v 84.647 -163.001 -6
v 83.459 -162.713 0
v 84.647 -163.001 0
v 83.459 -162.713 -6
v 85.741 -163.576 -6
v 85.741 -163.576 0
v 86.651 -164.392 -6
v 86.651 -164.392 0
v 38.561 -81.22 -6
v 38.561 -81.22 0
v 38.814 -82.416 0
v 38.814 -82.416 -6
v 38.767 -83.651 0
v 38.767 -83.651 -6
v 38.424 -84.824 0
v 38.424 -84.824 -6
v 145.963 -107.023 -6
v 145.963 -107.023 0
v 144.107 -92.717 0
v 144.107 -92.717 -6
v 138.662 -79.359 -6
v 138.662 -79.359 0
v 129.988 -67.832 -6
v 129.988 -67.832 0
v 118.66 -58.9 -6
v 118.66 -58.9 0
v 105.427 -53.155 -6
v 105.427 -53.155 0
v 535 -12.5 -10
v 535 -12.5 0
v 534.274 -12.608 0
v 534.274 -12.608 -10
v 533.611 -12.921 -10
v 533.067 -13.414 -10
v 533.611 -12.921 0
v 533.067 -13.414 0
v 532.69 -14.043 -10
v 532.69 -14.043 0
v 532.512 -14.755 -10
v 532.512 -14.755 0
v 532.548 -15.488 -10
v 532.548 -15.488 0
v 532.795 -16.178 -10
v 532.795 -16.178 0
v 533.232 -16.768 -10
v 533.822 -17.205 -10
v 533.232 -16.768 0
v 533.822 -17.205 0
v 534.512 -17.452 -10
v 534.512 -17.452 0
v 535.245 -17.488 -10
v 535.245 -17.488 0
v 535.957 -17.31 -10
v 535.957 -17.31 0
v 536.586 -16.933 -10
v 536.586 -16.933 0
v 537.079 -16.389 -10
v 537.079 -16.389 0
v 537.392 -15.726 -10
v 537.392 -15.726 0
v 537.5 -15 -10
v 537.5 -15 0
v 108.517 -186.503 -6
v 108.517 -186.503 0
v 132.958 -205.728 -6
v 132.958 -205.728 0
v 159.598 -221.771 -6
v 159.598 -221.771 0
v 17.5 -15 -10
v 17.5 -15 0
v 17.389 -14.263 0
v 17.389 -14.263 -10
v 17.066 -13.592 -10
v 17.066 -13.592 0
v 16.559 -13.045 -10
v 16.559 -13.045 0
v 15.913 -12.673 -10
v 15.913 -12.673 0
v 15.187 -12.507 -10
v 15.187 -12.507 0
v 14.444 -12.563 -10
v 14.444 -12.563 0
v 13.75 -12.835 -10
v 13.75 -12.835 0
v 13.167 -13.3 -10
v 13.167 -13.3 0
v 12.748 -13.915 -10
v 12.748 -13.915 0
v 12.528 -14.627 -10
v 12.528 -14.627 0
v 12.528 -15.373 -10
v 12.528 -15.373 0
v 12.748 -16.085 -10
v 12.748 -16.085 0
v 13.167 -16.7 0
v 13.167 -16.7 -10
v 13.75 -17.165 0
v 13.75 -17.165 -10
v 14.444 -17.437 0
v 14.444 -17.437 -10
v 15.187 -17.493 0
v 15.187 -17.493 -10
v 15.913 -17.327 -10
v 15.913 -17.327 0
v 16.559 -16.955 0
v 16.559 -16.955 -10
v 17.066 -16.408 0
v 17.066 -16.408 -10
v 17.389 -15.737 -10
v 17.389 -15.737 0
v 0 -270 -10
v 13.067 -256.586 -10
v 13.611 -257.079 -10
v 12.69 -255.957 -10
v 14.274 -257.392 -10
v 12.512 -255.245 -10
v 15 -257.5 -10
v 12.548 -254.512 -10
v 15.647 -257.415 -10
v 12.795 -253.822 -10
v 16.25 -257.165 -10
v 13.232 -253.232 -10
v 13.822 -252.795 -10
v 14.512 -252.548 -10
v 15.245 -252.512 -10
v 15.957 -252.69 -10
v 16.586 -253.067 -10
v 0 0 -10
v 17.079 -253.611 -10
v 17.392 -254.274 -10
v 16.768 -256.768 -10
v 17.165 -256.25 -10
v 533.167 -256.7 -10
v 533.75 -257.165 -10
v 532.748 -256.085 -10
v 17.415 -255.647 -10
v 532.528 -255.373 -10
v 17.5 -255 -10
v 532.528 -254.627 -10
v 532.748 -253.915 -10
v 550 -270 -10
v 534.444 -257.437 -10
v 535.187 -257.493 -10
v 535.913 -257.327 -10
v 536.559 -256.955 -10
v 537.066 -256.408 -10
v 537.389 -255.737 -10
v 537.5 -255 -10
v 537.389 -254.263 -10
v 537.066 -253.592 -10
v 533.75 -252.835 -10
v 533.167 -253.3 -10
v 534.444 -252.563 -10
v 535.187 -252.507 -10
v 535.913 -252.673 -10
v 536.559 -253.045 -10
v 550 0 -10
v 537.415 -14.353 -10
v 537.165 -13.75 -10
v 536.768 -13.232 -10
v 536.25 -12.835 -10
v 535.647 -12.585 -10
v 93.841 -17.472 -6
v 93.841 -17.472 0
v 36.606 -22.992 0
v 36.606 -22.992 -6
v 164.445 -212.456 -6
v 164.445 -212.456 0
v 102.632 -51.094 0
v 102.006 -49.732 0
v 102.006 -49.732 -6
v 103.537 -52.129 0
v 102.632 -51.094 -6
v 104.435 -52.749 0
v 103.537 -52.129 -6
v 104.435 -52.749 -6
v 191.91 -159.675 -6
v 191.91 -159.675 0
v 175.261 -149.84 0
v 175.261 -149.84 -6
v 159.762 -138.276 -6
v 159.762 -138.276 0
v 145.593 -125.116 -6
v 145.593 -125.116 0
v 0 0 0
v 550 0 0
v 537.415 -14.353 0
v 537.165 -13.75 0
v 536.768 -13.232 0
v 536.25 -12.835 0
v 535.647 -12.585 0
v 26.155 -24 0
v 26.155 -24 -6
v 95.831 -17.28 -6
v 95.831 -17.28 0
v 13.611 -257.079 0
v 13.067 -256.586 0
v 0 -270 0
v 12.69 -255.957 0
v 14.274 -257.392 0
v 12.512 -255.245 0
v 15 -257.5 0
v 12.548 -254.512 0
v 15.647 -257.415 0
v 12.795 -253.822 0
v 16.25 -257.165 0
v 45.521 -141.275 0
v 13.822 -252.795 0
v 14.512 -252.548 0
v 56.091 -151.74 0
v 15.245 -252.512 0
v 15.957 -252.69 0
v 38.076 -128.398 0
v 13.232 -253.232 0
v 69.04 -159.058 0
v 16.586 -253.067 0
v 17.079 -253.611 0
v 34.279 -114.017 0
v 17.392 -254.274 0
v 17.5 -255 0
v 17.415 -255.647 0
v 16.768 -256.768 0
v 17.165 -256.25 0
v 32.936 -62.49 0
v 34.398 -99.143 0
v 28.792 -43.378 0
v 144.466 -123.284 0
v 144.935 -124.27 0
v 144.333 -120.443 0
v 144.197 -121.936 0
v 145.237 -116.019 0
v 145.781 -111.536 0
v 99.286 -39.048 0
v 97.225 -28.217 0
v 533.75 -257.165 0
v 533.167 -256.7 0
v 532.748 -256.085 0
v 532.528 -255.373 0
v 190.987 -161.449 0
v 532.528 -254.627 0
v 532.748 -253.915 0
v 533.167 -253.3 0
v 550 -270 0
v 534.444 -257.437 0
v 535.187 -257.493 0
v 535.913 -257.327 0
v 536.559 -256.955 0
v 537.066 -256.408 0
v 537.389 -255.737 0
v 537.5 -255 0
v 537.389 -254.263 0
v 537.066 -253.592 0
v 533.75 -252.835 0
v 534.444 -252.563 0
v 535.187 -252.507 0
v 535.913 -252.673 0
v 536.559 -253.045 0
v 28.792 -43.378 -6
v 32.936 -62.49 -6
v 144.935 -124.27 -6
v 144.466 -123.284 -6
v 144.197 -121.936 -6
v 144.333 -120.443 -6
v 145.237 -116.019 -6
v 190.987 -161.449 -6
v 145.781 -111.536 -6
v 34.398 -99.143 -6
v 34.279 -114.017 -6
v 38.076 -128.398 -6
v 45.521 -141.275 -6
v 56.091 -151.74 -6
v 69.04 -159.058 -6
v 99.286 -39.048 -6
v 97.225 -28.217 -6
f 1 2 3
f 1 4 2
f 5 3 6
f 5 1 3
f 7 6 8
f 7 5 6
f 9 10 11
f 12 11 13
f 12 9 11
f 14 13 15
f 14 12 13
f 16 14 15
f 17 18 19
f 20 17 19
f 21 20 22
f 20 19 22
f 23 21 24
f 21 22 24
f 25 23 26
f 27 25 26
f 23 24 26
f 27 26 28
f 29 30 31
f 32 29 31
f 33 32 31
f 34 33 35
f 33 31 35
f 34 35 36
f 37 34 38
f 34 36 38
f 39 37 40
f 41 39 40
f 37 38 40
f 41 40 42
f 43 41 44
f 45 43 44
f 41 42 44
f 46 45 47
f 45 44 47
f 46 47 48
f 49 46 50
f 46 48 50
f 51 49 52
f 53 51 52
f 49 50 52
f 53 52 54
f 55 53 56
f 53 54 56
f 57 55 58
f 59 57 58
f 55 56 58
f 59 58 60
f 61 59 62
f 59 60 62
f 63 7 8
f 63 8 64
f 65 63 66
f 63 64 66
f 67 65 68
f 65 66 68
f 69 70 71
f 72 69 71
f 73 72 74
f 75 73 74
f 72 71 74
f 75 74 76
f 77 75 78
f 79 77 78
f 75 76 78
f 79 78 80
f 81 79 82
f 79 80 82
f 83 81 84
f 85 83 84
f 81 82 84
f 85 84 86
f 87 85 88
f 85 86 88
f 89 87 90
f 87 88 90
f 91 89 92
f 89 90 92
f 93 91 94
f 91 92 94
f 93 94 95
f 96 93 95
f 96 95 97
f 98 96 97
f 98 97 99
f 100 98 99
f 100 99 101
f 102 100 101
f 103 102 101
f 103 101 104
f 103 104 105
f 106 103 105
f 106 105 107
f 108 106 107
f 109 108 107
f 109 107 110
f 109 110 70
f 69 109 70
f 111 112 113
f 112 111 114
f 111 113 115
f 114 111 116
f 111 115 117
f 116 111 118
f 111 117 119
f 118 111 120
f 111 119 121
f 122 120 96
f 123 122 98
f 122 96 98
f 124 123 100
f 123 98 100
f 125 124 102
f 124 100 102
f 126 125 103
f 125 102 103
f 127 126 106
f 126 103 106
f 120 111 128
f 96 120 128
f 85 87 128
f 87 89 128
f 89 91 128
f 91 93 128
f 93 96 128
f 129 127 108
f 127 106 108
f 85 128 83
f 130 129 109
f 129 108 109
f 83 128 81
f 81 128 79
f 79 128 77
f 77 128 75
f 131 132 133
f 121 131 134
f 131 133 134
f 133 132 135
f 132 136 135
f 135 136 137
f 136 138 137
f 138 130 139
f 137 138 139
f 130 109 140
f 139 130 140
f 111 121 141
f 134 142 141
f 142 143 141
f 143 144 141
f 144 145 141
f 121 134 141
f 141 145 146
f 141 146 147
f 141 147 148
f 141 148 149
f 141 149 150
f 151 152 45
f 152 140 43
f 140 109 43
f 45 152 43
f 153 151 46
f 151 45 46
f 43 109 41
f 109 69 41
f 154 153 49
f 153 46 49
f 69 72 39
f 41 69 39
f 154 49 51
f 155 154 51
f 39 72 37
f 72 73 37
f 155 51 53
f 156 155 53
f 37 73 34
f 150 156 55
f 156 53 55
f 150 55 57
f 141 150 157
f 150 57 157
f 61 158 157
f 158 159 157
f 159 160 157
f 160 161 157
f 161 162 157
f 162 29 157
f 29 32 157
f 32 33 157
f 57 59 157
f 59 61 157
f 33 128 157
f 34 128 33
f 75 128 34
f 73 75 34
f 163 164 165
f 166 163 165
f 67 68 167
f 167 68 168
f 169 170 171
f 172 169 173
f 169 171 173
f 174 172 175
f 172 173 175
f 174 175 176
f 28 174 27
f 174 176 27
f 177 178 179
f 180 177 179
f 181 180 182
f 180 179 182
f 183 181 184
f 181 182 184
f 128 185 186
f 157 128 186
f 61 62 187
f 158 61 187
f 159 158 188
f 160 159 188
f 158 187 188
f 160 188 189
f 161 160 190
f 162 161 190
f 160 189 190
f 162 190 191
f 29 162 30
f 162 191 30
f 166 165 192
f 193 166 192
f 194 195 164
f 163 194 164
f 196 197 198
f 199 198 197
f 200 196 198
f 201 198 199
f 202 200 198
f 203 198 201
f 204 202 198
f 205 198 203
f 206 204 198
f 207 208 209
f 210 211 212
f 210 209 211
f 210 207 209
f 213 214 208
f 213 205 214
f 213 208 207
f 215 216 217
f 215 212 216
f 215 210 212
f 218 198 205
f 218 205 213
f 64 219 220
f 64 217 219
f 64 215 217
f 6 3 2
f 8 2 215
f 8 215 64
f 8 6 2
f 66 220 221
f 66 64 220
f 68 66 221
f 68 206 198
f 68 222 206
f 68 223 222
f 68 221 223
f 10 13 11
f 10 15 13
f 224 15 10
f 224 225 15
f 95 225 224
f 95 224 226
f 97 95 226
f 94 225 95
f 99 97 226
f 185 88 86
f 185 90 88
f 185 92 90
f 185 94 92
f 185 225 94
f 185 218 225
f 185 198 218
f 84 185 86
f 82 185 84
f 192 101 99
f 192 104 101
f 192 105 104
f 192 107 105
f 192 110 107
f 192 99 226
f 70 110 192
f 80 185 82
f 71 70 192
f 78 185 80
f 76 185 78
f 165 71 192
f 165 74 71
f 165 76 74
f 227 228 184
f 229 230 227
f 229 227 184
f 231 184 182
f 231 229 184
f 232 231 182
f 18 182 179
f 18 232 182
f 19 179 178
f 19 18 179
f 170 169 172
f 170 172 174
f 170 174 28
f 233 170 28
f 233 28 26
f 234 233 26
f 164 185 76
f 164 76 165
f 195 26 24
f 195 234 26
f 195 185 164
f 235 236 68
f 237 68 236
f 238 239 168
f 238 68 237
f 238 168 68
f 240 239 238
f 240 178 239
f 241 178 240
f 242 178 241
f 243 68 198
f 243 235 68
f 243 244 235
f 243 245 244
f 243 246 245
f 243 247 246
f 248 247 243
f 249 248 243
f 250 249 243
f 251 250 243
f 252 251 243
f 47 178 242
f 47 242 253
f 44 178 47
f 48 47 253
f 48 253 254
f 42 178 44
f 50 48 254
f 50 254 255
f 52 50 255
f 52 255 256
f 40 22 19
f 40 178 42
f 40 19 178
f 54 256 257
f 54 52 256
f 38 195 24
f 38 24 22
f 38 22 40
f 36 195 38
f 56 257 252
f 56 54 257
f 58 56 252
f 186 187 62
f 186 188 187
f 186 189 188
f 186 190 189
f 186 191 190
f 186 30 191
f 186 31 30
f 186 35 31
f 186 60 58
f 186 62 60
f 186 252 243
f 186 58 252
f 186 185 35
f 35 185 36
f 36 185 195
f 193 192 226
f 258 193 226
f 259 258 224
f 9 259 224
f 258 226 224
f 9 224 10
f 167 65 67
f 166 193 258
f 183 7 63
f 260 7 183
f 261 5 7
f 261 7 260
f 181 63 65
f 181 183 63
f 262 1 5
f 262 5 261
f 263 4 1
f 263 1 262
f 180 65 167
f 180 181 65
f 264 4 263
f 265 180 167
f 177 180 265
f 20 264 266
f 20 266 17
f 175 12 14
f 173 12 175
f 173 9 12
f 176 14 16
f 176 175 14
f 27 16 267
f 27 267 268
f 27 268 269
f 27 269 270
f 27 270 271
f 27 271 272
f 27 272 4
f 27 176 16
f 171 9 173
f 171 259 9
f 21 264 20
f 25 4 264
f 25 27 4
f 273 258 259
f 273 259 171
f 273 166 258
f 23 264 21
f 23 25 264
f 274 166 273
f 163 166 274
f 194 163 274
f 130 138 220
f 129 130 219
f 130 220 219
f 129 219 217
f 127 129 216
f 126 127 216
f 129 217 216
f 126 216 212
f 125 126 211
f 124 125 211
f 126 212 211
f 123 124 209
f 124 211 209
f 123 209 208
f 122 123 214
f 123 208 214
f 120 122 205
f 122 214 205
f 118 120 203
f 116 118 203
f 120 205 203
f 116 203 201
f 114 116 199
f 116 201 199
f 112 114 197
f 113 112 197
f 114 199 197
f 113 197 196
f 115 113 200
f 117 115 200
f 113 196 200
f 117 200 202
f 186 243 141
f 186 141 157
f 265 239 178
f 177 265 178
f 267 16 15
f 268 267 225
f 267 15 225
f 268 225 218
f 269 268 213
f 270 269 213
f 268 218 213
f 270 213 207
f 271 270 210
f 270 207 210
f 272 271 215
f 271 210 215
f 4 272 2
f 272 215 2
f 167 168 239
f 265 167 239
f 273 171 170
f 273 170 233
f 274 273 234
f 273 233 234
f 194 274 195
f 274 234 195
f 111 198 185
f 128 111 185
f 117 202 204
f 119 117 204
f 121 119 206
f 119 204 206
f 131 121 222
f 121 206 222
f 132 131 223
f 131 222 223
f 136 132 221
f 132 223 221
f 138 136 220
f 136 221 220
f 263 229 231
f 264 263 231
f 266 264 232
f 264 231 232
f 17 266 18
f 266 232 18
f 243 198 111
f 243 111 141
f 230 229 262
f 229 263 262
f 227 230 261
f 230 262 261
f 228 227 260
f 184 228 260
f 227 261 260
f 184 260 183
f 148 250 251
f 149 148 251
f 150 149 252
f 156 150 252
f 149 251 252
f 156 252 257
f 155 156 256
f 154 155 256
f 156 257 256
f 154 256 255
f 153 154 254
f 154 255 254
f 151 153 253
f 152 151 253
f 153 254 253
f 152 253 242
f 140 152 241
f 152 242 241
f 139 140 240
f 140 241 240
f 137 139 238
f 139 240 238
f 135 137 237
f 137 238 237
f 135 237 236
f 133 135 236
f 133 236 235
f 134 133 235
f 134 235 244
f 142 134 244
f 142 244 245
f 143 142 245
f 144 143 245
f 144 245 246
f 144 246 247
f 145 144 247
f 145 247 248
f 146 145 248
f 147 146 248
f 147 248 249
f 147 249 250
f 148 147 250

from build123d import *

# Parameters (mm, degrees)
F0_W     = 550
F0_H     = 270
F1_DEPTH = 10
F3_DEPTH = 6
F2_R     = 2.5
F4_DEPTH = 25
F5_R     = 5


with BuildPart() as f1:
    # F0 (on Top) → F1 (new body)
    with BuildSketch(Plane.XY):
        with Locations((275, -135)):
            Rectangle(F0_W, F0_H)
    extrude(amount=-F1_DEPTH)

    # F2 (on face) → F3 (cut)
    with BuildSketch(Plane.XY):
        with BuildLine():
            ThreePointArc((93.8406279725, -17.4723188671), (96.3763447636, -34.89397928), (100.5834584289, -51.9891337337))
            ThreePointArc((100.5834584289, -51.9891337337), (101.702824577, -52.2182469254), (102.8172889589, -52.4701250099))
            ThreePointArc((102.8172889589, -52.4701250099), (98.4454239564, -35.0497029669), (95.8313903025, -17.2803153631))
            Line((95.8313903025, -17.2803153631), (93.8406279725, -17.4723188671))
        make_face()
        with BuildLine():
            ThreePointArc((36.6062109858, -22.9924196081), (40.2678425285, -47.5506492992), (46.4524007703, -71.5977994519))
            ThreePointArc((46.4524007703, -71.5977994519), (70.8084957225, -54.3138897804), (100.5834584289, -51.9891337337))
            ThreePointArc((100.5834584289, -51.9891337337), (96.3763447636, -34.89397928), (93.8406279725, -17.4723188671))
            Line((93.8406279725, -17.4723188671), (36.6062109858, -22.9924196081))
        make_face()
        with BuildLine():
            ThreePointArc((26.1547087534, -24.0004380043), (30.8880481953, -53.9384370008), (39.2095922874, -83.0835942334))
            ThreePointArc((39.2095922874, -83.0835942334), (42.4819606163, -77.1205988593), (46.4524007703, -71.5977994519))
            ThreePointArc((46.4524007703, -71.5977994519), (40.2678425285, -47.5506492992), (36.6062109858, -22.9924196081))
            Line((36.6062109858, -22.9924196081), (26.1547087534, -24.0004380043))
        make_face()
        with BuildLine():
            ThreePointArc((39.2095922874, -83.0835942334), (41.3696850637, -135.0845918815), (85.359218008, -162.8998889056))
            ThreePointArc((85.359218008, -162.8998889056), (58.5731428007, -125.1375862115), (39.2095922874, -83.0835942334))
        make_face()
        with BuildLine():
            ThreePointArc((39.2095922874, -83.0835942334), (58.5731428007, -125.1375862115), (85.359218008, -162.8998889056))
            ThreePointArc((85.359218008, -162.8998889056), (92.159689712, -163.0387878421), (98.9269281749, -162.353082441))
            ThreePointArc((98.9269281749, -162.353082441), (67.6630708031, -119.8818075906), (46.4524007703, -71.5977994519))
            ThreePointArc((46.4524007703, -71.5977994519), (42.4819606163, -77.1205988593), (39.2095922874, -83.0835942334))
        make_face()
        with BuildLine():
            ThreePointArc((46.4524007703, -71.5977994519), (67.6630708031, -119.8818075906), (98.9269281749, -162.353082441))
            ThreePointArc((98.9269281749, -162.353082441), (126.0574308053, -149.8675419291), (142.9268949098, -125.2225814773))
            ThreePointArc((142.9268949098, -125.2225814773), (117.4412479589, -91.100162762), (100.5834584289, -51.9891337337))
            ThreePointArc((100.5834584289, -51.9891337337), (70.8084957225, -54.3138897804), (46.4524007703, -71.5977994519))
        make_face()
        with BuildLine():
            ThreePointArc((100.5834584289, -51.9891337337), (117.4412479589, -91.100162762), (142.9268949098, -125.2225814773))
            ThreePointArc((142.9268949098, -125.2225814773), (143.2867819227, -124.1381669965), (143.6244940218, -123.0466433063))
            ThreePointArc((143.6244940218, -123.0466433063), (119.1726628165, -90.0990620723), (102.8172889589, -52.4701250099))
            ThreePointArc((102.8172889589, -52.4701250099), (101.702824577, -52.2182469254), (100.5834584289, -51.9891337337))
        make_face()
        with BuildLine():
            ThreePointArc((102.8172889589, -52.4701250099), (119.1726628165, -90.0990620723), (143.6244940218, -123.0466433063))
            ThreePointArc((143.6244940218, -123.0466433063), (145.375436454, -115.11981647), (145.9631920321, -107.023216784))
            ThreePointArc((145.9631920321, -107.023216784), (133.8730301026, -72.2467564476), (102.8172889589, -52.4701250099))
        make_face()
        with BuildLine():
            ThreePointArc((142.9268949098, -125.2225814773), (165.4491613095, -145.3362093293), (190.9870540226, -161.4491403142))
            Line((190.9870540226, -161.4491403142), (191.9102732092, -159.6749739371))
            ThreePointArc((191.9102732092, -159.6749739371), (166.2146946142, -143.4076613439), (143.6244940218, -123.0466433063))
            ThreePointArc((143.6244940218, -123.0466433063), (143.2867819227, -124.1381669965), (142.9268949098, -125.2225814773))
        make_face()
        with BuildLine():
            ThreePointArc((98.9269281749, -162.353082441), (129.5126452175, -190.2463655327), (164.4445024089, -212.4564236553))
            Line((164.4445024089, -212.4564236553), (190.9870540226, -161.4491403142))
            ThreePointArc((190.9870540226, -161.4491403142), (165.4491613095, -145.3362093293), (142.9268949098, -125.2225814773))
            ThreePointArc((142.9268949098, -125.2225814773), (126.0574308053, -149.8675419291), (98.9269281749, -162.353082441))
        make_face()
        with BuildLine():
            ThreePointArc((85.359218008, -162.8998889056), (119.6639725539, -195.884452107), (159.5976016794, -221.7707971349))
            Line((159.5976016794, -221.7707971349), (164.4445024089, -212.4564236553))
            ThreePointArc((164.4445024089, -212.4564236553), (129.5126452175, -190.2463655327), (98.9269281749, -162.353082441))
            ThreePointArc((98.9269281749, -162.353082441), (92.159689712, -163.0387878421), (85.359218008, -162.8998889056))
        make_face()
    extrude(amount=-F3_DEPTH, mode=Mode.SUBTRACT)

    # F2 (on face) → F4 (cut)
    with BuildSketch(Plane.XY):
        with BuildLine():
            ThreePointArc((17.5, -255), (13.232233047, -253.232233047), (15, -257.5))
            ThreePointArc((15, -257.5), (16.767766953, -256.767766953), (17.5, -255))
        make_face()
        with Locations((15, -15)):
            Circle(F2_R)
        with BuildLine():
            ThreePointArc((537.5, -15), (536.767766953, -13.232233047), (535, -12.5))
            ThreePointArc((535, -12.5), (533.232233047, -16.767766953), (537.5, -15))
        make_face()
        with Locations((535, -255)):
            Circle(F2_R)
    extrude(amount=-F4_DEPTH, mode=Mode.SUBTRACT)

    # F5
    f5_edges = [f1.edges().sort_by_distance(p)[0] for p in [
        (102.817289, -52.470125, -3),
        (143.624494, -123.046643, -3),
        (85.359218, -162.899889, -3),
        (39.209592, -83.083594, -3),
    ]]
    fillet(f5_edges, radius=F5_R)


solid = f1.part
